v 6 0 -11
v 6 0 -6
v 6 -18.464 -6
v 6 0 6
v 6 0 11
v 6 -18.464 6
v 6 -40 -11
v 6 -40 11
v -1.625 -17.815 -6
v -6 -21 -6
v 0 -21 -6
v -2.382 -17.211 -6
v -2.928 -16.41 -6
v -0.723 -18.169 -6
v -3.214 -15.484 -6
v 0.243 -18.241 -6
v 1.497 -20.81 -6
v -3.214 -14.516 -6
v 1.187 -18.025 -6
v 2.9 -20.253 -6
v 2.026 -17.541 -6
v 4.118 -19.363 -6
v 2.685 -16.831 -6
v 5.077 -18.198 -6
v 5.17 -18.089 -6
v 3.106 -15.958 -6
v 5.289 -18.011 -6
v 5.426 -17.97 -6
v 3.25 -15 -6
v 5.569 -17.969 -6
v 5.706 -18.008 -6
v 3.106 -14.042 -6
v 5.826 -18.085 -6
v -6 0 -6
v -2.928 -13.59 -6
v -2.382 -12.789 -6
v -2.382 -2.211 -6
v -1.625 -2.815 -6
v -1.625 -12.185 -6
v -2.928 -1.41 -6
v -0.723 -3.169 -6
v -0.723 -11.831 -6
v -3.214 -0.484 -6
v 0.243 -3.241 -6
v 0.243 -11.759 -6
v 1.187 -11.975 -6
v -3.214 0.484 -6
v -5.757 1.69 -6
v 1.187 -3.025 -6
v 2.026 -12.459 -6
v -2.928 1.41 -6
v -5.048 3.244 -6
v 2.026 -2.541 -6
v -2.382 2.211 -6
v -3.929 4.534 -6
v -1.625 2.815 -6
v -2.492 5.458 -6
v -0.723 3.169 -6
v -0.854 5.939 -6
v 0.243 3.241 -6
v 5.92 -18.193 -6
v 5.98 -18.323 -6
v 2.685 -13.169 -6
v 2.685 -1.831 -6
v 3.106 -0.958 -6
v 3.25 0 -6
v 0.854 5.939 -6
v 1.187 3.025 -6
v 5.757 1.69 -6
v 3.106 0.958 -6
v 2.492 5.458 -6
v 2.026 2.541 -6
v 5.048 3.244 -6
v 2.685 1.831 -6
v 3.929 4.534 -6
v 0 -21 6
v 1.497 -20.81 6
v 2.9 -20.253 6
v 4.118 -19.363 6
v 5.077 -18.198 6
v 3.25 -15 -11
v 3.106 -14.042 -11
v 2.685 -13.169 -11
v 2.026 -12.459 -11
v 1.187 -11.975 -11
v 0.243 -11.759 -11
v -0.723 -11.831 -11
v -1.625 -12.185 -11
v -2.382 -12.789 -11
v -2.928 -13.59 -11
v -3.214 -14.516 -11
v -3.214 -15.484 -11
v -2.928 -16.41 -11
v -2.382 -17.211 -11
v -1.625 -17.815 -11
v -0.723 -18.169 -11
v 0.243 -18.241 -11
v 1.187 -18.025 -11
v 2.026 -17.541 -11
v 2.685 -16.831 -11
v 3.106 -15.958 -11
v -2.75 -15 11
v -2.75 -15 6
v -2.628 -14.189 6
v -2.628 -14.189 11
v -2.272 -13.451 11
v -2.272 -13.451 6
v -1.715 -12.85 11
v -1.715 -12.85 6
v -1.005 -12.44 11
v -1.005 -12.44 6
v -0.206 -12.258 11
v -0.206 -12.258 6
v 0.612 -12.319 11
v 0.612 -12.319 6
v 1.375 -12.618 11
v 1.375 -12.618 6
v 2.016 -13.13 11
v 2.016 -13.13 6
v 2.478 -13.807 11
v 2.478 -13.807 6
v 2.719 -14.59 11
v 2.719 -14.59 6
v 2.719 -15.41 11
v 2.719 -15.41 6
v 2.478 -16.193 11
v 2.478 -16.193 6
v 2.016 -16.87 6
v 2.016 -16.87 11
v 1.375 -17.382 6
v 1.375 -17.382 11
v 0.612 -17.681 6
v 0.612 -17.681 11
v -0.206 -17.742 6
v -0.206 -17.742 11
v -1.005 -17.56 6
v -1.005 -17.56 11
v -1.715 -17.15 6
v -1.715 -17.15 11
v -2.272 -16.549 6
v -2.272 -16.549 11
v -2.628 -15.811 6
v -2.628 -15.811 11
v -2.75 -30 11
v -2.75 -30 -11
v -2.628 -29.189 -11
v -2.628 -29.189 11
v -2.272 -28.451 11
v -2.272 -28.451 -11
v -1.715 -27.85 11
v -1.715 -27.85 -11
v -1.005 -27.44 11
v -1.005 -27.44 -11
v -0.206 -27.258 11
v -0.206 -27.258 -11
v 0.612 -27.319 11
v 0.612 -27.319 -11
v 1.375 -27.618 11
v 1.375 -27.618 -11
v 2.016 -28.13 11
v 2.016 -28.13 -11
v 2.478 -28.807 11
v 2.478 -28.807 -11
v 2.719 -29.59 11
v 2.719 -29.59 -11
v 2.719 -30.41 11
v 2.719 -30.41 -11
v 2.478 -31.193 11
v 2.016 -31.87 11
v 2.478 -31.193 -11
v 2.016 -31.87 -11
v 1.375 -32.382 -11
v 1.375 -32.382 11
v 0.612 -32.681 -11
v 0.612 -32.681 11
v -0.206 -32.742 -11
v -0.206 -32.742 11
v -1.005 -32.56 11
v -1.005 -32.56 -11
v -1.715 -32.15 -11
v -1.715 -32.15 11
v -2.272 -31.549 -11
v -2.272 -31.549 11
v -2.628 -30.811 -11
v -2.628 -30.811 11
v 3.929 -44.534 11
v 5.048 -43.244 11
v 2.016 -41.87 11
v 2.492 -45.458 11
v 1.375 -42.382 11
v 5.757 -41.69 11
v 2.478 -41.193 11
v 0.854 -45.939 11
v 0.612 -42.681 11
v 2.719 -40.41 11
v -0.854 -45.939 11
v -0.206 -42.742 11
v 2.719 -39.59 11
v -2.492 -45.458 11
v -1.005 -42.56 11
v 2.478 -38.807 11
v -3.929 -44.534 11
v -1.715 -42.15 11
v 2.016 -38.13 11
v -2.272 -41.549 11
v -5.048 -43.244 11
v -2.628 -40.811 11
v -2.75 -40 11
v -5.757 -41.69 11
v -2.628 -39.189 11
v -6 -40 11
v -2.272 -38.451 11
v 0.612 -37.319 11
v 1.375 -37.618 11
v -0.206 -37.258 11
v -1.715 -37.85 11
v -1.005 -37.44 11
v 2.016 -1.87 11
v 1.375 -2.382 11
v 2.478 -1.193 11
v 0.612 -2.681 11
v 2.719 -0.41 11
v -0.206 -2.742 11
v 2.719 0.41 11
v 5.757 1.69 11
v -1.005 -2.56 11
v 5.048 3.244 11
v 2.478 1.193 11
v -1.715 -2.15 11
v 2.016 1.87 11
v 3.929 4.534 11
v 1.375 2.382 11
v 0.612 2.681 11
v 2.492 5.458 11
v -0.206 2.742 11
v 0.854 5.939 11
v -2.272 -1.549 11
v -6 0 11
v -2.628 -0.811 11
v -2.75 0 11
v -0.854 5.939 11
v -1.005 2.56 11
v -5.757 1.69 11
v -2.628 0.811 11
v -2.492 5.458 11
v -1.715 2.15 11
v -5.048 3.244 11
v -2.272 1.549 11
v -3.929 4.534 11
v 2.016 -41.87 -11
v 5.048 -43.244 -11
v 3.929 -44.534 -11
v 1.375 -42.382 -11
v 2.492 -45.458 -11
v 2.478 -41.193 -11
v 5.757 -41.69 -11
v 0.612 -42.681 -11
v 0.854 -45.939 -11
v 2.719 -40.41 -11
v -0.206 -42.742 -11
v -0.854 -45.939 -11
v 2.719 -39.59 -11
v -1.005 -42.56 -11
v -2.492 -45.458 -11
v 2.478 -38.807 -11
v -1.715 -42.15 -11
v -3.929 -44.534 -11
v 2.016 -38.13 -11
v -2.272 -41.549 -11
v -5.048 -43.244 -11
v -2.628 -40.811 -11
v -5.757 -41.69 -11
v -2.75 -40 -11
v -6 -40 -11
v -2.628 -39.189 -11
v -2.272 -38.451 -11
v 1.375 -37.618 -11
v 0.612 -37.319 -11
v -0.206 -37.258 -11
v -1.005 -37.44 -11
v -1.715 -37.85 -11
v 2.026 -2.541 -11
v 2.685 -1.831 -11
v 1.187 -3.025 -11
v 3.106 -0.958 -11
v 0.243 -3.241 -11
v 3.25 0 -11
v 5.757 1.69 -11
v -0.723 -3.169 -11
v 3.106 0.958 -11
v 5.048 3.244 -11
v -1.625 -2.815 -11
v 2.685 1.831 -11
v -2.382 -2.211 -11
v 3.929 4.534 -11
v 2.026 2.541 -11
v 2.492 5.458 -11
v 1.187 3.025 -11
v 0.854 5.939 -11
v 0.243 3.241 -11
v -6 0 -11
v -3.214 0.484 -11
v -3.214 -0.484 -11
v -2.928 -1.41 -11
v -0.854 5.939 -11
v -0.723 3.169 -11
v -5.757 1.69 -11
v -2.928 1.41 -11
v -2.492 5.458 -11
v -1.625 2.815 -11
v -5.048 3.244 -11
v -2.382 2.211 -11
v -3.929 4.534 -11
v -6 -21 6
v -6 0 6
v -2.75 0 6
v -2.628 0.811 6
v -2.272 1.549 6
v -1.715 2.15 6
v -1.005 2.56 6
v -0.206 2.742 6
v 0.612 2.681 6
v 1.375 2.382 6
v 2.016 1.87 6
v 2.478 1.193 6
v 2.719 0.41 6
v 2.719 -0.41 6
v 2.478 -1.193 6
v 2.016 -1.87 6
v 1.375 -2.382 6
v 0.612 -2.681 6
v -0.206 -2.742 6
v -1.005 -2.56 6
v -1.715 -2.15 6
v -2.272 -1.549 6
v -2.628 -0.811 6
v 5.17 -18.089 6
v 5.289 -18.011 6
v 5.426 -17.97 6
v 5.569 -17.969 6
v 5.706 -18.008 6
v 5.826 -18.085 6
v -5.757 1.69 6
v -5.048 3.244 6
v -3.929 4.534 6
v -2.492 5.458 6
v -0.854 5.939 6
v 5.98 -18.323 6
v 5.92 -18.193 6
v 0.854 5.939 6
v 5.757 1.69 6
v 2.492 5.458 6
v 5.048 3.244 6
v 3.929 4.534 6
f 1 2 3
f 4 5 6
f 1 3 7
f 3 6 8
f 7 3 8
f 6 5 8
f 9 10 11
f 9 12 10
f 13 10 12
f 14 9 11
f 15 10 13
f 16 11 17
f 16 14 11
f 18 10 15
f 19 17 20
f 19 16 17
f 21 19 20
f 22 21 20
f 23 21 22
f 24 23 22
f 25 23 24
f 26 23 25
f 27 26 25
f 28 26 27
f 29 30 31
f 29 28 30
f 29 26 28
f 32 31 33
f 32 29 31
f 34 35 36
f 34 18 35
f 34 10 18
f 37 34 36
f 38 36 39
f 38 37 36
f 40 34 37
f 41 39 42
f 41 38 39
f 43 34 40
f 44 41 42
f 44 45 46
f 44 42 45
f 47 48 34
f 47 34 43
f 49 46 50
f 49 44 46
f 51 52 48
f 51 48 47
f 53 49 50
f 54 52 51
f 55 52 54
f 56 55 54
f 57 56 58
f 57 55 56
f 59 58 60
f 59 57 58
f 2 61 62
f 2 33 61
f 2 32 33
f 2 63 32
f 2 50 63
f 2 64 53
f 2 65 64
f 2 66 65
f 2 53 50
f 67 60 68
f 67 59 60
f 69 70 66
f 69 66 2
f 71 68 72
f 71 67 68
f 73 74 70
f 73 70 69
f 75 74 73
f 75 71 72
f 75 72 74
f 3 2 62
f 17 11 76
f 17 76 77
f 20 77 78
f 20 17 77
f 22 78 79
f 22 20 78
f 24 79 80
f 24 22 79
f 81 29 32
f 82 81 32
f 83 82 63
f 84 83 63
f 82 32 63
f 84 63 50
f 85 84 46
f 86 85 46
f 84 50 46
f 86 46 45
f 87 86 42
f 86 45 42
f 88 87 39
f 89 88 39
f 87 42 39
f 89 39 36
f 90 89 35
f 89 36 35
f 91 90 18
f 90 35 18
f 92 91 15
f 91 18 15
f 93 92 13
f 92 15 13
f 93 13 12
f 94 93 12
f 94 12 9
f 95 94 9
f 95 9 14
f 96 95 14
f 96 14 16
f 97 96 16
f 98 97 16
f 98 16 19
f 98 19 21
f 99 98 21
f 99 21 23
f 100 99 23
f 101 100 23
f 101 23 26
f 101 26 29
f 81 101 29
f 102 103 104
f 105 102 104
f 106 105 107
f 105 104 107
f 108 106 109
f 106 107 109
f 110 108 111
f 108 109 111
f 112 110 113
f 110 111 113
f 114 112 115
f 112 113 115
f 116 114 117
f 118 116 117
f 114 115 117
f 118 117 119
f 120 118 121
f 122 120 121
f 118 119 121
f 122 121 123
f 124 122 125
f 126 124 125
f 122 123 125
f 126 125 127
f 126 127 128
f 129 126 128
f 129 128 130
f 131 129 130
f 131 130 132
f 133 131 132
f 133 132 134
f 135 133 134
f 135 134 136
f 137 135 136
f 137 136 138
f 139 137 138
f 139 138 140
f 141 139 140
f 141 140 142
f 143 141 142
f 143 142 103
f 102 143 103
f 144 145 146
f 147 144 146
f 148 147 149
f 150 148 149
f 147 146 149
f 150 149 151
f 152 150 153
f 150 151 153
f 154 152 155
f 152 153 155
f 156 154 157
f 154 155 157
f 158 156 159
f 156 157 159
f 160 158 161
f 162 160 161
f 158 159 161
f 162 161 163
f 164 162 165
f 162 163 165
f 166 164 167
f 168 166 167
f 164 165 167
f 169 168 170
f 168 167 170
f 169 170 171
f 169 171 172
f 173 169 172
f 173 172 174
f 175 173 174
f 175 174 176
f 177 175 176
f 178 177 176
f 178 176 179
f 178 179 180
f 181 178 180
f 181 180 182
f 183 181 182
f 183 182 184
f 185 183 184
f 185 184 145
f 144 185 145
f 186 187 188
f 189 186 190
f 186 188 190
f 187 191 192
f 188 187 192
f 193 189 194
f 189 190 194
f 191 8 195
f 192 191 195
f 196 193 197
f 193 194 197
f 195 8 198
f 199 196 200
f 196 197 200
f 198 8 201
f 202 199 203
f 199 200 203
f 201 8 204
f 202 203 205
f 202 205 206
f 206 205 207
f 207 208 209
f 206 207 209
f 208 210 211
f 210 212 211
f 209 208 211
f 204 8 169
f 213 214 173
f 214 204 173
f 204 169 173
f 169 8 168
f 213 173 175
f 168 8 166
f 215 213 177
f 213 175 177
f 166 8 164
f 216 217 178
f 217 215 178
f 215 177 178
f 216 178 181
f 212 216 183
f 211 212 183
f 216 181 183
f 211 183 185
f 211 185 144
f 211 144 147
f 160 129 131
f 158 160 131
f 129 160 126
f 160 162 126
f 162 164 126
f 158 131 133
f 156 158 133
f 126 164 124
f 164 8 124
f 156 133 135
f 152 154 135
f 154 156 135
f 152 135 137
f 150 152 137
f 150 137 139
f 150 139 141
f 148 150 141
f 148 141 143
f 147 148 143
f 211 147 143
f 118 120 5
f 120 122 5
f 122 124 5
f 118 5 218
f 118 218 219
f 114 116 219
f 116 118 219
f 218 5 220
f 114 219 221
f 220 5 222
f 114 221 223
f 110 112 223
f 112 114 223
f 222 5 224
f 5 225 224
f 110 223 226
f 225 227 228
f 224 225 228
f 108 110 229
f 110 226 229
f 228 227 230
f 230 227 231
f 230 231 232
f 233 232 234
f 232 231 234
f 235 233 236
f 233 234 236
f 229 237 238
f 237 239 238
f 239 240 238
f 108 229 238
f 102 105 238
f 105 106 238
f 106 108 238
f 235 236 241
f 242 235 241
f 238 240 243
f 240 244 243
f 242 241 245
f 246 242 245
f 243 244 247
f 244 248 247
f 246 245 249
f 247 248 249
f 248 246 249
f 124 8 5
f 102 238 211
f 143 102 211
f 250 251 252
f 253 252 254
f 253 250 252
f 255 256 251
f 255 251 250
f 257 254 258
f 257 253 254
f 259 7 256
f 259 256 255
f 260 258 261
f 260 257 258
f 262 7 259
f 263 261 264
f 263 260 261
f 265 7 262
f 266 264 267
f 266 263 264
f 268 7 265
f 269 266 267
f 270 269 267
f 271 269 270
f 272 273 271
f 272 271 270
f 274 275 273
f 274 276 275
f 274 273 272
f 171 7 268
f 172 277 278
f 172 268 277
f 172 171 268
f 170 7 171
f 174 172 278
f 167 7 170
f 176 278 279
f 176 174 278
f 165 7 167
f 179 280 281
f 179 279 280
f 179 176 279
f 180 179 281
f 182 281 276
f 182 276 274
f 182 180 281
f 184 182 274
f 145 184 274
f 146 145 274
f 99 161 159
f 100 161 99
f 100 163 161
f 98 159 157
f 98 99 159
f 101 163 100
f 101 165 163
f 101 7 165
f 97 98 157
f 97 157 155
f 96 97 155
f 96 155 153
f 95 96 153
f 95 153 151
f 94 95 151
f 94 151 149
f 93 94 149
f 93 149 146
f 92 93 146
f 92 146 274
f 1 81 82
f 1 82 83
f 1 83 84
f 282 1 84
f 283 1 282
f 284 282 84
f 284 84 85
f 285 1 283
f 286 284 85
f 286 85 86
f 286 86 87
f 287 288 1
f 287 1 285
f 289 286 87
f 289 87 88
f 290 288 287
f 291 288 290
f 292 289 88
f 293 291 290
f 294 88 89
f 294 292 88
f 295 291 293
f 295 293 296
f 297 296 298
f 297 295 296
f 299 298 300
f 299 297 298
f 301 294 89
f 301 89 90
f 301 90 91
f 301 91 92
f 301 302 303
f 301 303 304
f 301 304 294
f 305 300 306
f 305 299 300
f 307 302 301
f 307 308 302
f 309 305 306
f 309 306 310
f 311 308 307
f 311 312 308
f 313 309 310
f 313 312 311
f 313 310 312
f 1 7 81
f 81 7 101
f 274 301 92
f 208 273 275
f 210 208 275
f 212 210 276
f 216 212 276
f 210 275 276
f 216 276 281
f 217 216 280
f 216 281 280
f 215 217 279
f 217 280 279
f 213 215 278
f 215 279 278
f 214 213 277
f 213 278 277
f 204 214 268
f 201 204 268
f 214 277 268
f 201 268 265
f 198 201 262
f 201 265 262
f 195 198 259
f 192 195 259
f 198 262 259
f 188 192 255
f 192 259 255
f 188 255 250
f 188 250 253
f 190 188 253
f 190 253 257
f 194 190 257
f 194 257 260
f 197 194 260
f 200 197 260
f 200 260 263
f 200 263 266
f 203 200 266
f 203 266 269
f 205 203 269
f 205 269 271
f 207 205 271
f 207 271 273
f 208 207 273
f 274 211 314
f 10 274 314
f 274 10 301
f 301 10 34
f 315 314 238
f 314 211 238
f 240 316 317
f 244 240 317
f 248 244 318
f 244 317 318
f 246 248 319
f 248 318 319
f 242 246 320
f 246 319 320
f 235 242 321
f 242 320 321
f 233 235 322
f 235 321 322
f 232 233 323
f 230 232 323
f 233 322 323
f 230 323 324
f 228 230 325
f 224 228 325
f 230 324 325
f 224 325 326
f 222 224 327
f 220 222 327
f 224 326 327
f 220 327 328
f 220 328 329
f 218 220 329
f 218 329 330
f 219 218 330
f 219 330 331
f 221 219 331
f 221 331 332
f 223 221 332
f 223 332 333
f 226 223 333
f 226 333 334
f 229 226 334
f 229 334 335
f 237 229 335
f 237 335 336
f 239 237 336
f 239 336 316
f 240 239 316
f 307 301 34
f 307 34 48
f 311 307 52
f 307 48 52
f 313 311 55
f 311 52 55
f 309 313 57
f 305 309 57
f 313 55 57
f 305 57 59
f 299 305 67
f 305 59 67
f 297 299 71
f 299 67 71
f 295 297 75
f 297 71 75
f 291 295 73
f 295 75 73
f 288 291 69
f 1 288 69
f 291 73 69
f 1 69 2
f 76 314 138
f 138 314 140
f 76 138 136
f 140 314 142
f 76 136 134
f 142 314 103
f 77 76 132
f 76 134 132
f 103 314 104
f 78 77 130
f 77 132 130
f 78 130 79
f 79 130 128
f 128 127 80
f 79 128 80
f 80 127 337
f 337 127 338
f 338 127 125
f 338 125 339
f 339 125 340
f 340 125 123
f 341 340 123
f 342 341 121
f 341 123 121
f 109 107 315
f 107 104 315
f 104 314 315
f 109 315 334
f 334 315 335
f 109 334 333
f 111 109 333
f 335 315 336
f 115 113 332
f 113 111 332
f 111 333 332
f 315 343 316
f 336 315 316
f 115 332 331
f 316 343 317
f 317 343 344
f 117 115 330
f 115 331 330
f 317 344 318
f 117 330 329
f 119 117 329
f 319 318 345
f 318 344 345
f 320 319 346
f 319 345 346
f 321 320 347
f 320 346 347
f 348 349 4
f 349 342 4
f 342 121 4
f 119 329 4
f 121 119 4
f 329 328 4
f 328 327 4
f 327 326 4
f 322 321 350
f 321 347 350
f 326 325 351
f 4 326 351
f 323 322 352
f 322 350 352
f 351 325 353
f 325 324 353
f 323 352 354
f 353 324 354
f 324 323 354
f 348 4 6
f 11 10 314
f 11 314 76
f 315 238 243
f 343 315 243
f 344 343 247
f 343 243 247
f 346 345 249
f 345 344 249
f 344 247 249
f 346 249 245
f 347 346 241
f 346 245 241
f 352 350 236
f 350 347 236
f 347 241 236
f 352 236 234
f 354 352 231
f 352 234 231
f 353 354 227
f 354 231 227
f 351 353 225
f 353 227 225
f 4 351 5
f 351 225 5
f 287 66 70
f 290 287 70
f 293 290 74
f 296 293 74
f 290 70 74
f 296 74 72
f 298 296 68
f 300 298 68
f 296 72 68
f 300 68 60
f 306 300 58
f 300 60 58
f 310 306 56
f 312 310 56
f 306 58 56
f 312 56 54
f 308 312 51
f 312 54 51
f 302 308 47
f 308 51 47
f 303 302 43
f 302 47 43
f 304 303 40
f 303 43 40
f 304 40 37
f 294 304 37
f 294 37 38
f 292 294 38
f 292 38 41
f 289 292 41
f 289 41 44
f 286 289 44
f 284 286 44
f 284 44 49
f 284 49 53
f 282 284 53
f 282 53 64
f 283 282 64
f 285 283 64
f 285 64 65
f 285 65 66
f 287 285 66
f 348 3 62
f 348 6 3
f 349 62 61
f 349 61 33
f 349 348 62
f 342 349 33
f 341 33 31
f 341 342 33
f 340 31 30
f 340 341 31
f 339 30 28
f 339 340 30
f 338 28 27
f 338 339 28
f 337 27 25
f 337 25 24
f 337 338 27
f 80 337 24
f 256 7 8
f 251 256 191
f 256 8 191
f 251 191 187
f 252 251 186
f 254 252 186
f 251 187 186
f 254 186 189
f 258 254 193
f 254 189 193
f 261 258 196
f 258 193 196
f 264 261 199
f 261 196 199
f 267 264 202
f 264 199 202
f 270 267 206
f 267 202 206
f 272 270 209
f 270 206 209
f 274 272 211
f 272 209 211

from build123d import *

# Parameters (mm, degrees)
BOSS_EXTRUDE1_DEPTH  = 11
M5_CLEARANCE_HOLE1_D = 5.5
CUT_EXTRUDE1_DEPTH   = 6
SKETCH1_4_R          = 3.25
CUT_EXTRUDE2_DEPTH   = 48.675989764
FILLET1_R            = 0.5


with BuildPart() as part:
    # Sketch1 → Boss-Extrude1 (new, symmetric)
    with BuildSketch(Plane.XY):
        with BuildLine():
            ThreePointArc((6, 0), (0, 6), (-6, 0))
            Line((-6, 0), (-6, -40))
            ThreePointArc((-6, -40), (0, -46), (6, -40))
            Line((6, -40), (6, 0))
        make_face()
    extrude(amount=BOSS_EXTRUDE1_DEPTH, both=True)

    # M5 Clearance Hole1 (through all)
    with Locations(Plane.XY.offset(11)):
        with Locations((0, 0), (0, -15), (0, -30), (0, -40)):
            Hole(M5_CLEARANCE_HOLE1_D / 2)

    # Sketch1<3> → Cut-Extrude1 (cut, symmetric)
    with BuildSketch(Plane.XY):
        with BuildLine():
            Line((6, -15), (6, 0))
            ThreePointArc((6, 0), (0, 6), (-6, 0))
            Line((-6, 0), (-6, -21))
            Line((-6, -21), (0, -21))
            ThreePointArc((0, -21), (4.242640687, -19.242640687), (6, -15))
        make_face()
    extrude(amount=CUT_EXTRUDE1_DEPTH, both=True, mode=Mode.SUBTRACT)

    # Sketch1<4> → Cut-Extrude2 (cut, through all)
    with BuildSketch(Plane.XY):
        Circle(SKETCH1_4_R)
        with Locations((0, -15)):
            Circle(SKETCH1_4_R)
    extrude(amount=-CUT_EXTRUDE2_DEPTH, mode=Mode.SUBTRACT)

    # Fillet1
    fillet1_edges = [part.edges().sort_by_distance(p)[0] for p in [
        (6, -15, 0),
    ]]
    fillet(fillet1_edges, radius=FILLET1_R)


solid = part.part
